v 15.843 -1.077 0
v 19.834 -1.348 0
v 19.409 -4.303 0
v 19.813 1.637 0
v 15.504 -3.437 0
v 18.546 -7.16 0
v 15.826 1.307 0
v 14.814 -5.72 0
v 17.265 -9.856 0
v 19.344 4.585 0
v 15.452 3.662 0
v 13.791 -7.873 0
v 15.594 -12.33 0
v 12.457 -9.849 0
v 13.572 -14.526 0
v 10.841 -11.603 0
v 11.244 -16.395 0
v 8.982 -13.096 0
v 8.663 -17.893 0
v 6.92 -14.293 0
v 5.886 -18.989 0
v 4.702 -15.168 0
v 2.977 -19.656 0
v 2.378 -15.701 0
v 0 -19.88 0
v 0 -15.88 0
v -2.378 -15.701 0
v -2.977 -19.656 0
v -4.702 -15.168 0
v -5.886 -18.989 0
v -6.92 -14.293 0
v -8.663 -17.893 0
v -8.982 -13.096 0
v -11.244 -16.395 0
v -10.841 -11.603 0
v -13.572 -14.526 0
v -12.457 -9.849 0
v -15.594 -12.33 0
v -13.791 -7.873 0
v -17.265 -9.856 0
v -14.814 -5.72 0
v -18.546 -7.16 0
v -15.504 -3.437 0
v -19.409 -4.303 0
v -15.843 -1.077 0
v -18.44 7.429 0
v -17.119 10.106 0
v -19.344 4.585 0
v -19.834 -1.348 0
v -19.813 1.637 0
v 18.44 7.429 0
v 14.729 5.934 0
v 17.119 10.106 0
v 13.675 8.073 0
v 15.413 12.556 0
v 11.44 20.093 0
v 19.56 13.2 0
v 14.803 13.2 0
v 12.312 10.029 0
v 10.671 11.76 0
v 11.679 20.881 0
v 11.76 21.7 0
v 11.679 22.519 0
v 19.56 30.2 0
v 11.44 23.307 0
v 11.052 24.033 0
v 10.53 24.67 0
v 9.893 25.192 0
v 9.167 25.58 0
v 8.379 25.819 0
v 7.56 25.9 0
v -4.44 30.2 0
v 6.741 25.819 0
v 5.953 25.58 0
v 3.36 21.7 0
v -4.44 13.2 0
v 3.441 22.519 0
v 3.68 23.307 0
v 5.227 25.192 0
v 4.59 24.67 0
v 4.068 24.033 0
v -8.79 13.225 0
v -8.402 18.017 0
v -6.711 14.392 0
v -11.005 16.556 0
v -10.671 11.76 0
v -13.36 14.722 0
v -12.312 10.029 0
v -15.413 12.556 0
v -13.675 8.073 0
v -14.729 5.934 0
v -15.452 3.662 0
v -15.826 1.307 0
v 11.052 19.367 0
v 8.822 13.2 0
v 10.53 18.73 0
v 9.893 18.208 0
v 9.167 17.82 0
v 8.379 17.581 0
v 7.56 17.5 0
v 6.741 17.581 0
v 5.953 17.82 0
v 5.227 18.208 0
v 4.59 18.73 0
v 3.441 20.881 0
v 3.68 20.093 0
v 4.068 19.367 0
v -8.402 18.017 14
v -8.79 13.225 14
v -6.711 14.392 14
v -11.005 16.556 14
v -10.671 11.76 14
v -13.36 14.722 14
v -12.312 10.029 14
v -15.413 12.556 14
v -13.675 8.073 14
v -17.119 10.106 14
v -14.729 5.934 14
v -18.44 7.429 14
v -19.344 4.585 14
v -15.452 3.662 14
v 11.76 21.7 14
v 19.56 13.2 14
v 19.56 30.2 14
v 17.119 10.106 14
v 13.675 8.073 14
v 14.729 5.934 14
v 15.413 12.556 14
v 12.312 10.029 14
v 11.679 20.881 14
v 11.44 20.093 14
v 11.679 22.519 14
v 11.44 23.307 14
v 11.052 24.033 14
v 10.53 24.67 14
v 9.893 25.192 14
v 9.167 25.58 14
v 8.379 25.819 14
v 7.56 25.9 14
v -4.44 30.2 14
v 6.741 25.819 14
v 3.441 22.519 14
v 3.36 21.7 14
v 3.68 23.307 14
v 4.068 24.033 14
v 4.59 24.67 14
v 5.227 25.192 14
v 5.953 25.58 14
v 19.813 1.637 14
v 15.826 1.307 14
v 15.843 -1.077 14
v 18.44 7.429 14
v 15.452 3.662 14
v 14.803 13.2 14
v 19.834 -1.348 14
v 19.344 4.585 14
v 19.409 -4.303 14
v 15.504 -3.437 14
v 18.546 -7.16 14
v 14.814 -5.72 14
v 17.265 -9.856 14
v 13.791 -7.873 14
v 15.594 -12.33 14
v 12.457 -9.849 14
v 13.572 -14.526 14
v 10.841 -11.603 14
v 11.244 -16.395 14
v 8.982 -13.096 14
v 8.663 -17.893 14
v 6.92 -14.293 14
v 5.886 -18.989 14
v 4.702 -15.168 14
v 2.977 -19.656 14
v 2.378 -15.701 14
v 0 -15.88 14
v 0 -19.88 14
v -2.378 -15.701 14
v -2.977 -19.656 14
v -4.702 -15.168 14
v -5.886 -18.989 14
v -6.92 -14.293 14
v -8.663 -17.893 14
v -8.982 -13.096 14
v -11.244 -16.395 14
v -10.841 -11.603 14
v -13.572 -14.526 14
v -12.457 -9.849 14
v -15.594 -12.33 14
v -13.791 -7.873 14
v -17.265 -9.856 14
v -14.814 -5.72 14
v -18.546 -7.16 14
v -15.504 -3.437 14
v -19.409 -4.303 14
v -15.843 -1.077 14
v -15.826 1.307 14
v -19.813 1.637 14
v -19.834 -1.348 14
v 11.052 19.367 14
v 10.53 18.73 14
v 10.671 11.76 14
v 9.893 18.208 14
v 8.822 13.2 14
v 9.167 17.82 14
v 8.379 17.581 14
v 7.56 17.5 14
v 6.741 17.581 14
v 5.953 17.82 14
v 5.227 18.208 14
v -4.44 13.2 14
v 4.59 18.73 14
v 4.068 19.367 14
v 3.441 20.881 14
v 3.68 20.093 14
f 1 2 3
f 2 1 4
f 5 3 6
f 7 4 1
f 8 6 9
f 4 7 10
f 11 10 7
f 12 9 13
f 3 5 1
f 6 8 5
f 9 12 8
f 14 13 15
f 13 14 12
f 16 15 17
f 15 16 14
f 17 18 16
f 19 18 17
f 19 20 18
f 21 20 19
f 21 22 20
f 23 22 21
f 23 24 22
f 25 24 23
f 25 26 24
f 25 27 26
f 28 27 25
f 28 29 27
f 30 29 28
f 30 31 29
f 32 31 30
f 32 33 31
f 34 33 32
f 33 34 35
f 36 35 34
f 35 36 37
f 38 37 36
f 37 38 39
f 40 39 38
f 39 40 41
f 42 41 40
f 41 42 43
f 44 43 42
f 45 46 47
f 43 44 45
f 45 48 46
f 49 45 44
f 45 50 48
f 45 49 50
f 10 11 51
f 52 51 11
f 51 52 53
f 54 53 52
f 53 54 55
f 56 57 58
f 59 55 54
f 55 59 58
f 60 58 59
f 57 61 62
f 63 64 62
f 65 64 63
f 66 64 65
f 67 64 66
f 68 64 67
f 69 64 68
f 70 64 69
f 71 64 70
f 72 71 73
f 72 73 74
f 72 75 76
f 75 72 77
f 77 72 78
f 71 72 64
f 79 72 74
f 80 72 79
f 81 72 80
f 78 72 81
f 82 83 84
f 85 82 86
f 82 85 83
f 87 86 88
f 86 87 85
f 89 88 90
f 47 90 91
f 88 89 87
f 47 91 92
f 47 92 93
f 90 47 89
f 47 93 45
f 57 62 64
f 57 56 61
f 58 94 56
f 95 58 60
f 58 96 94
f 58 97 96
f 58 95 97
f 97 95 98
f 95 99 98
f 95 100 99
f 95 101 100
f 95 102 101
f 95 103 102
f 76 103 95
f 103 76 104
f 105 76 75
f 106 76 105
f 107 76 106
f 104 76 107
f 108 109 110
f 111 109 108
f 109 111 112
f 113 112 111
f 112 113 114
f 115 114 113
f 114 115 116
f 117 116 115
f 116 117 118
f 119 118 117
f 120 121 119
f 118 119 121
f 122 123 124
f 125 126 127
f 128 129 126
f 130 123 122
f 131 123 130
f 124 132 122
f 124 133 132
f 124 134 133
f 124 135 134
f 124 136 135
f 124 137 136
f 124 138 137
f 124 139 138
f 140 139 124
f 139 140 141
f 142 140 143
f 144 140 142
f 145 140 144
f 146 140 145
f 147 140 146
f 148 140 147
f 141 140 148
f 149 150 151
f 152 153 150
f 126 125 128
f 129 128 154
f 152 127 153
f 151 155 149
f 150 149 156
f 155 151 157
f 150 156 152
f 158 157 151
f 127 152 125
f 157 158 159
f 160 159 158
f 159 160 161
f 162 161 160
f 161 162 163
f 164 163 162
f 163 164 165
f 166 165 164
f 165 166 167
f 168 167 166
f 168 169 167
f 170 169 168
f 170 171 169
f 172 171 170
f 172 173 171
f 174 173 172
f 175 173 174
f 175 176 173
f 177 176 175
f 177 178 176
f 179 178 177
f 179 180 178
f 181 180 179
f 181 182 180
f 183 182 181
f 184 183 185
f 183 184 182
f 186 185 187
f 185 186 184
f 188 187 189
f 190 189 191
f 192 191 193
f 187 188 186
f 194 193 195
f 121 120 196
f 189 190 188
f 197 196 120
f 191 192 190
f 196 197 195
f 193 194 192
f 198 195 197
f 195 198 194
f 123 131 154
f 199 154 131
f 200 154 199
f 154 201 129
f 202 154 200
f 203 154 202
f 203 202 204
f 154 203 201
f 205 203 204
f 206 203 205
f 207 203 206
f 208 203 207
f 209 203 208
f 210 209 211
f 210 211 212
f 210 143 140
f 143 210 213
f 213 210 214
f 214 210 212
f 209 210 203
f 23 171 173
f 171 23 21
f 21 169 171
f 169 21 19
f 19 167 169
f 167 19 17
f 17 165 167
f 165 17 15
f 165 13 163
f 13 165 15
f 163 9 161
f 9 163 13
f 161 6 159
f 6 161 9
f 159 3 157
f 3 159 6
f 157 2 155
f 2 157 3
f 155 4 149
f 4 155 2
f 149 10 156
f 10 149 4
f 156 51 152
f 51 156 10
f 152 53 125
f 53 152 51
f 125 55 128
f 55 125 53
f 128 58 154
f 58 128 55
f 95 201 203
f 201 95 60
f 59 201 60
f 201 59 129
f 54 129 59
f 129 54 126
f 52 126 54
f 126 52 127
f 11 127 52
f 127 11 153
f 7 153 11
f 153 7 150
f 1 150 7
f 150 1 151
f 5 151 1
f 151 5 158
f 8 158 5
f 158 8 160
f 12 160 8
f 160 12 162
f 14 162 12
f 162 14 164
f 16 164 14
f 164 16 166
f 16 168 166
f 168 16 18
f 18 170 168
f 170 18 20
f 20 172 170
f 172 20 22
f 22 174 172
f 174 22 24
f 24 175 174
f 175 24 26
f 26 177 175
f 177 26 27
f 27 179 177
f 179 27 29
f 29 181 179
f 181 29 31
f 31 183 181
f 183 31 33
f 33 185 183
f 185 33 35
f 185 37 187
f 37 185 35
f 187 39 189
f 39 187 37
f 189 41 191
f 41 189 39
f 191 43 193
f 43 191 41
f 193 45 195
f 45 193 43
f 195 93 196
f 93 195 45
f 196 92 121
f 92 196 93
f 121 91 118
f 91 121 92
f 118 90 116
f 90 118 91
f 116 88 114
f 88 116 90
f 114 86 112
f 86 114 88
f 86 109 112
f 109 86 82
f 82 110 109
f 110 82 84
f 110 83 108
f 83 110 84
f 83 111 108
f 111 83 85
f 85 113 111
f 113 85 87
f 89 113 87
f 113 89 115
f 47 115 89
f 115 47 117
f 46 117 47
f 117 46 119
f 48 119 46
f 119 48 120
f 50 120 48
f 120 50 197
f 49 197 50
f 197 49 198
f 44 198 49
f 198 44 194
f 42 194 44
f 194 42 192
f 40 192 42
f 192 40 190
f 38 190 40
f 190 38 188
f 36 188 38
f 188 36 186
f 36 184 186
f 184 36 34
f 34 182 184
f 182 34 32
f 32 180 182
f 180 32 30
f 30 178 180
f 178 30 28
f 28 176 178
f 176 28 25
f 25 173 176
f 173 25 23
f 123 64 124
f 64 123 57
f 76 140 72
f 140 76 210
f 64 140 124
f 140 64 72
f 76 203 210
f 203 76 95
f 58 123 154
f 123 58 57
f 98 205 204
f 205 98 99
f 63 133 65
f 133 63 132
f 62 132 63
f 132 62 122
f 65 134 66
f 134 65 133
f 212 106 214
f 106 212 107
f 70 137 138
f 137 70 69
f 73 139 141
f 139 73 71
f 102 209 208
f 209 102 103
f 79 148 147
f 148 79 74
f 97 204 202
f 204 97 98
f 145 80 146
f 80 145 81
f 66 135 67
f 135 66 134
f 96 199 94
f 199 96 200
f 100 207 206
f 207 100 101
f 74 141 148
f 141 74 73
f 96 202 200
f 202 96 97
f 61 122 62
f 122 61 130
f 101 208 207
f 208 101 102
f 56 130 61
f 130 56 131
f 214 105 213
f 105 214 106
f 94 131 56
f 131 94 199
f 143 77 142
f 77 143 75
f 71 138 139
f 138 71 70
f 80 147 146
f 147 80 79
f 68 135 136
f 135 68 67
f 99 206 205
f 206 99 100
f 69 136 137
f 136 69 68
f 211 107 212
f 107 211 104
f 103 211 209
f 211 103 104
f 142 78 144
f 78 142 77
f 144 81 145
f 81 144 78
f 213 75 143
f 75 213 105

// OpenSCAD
$fn = 32;

// ----------------------------------------------------------------------
// Pipe clamp: 39.76 mm ring, 4 mm wall, 14 mm wide
// ----------------------------------------------------------------------

// --- parameters (mm) ---
outer_r = 19.88;          // clamp outside radius
inner_r = 15.88;          // pipe bore radius
band = 4;                 // band thickness
clamp_w = 14;             // clamp width
opening = 50;             // opening angle between the ends
lug_w = 24;               // lug width
lug_len = 17;             // lug length
bolt_d = 8.4;             // bolt hole

clamp_profile = [[-8.402, 18.017], [-11.005, 16.556], [-13.36, 14.722], [-15.413, 12.556], [-17.119, 10.106], [-18.44, 7.429], [-19.344, 4.585], [-19.813, 1.637], [-19.834, -1.348], [-19.409, -4.303], [-18.546, -7.16], [-17.265, -9.856], [-15.594, -12.33], [-13.572, -14.526], [-11.244, -16.395], [-8.663, -17.893], [-5.886, -18.989], [-2.977, -19.656], [0, -19.88], [2.977, -19.656], [5.886, -18.989], [8.663, -17.893], [11.244, -16.395], [13.572, -14.526], [15.594, -12.33], [17.265, -9.856], [18.546, -7.16], [19.409, -4.303], [19.834, -1.348], [19.813, 1.637], [19.344, 4.585], [18.44, 7.429], [17.119, 10.106], [15.413, 12.556], [13.36, 14.722], [11.005, 16.556], [8.402, 18.017], [6.711, 14.392], [8.79, 13.225], [10.671, 11.76], [12.312, 10.029], [13.675, 8.073], [14.729, 5.934], [15.452, 3.662], [15.826, 1.307], [15.843, -1.077], [15.504, -3.437], [14.814, -5.72], [13.791, -7.873], [12.457, -9.849], [10.841, -11.603], [8.982, -13.096], [6.92, -14.293], [4.702, -15.168], [2.378, -15.701], [0, -15.88], [-2.378, -15.701], [-4.702, -15.168], [-6.92, -14.293], [-8.982, -13.096], [-10.841, -11.603], [-12.457, -9.849], [-13.791, -7.873], [-14.814, -5.72], [-15.504, -3.437], [-15.843, -1.077], [-15.826, 1.307], [-15.452, 3.662], [-14.729, 5.934], [-13.675, 8.073], [-12.312, 10.029], [-10.671, 11.76], [-8.79, 13.225], [-6.711, 14.392]];

difference() {
  union() {
    linear_extrude(height = clamp_w) polygon(clamp_profile);
    /* bolt lug on the other end */
    translate([-4.44, 13.2, 0]) cube([lug_w, 17, clamp_w]);
  }
  translate([7.56, 21.7, -2.5]) cylinder(h = clamp_w + 5, d = bolt_d);
}
